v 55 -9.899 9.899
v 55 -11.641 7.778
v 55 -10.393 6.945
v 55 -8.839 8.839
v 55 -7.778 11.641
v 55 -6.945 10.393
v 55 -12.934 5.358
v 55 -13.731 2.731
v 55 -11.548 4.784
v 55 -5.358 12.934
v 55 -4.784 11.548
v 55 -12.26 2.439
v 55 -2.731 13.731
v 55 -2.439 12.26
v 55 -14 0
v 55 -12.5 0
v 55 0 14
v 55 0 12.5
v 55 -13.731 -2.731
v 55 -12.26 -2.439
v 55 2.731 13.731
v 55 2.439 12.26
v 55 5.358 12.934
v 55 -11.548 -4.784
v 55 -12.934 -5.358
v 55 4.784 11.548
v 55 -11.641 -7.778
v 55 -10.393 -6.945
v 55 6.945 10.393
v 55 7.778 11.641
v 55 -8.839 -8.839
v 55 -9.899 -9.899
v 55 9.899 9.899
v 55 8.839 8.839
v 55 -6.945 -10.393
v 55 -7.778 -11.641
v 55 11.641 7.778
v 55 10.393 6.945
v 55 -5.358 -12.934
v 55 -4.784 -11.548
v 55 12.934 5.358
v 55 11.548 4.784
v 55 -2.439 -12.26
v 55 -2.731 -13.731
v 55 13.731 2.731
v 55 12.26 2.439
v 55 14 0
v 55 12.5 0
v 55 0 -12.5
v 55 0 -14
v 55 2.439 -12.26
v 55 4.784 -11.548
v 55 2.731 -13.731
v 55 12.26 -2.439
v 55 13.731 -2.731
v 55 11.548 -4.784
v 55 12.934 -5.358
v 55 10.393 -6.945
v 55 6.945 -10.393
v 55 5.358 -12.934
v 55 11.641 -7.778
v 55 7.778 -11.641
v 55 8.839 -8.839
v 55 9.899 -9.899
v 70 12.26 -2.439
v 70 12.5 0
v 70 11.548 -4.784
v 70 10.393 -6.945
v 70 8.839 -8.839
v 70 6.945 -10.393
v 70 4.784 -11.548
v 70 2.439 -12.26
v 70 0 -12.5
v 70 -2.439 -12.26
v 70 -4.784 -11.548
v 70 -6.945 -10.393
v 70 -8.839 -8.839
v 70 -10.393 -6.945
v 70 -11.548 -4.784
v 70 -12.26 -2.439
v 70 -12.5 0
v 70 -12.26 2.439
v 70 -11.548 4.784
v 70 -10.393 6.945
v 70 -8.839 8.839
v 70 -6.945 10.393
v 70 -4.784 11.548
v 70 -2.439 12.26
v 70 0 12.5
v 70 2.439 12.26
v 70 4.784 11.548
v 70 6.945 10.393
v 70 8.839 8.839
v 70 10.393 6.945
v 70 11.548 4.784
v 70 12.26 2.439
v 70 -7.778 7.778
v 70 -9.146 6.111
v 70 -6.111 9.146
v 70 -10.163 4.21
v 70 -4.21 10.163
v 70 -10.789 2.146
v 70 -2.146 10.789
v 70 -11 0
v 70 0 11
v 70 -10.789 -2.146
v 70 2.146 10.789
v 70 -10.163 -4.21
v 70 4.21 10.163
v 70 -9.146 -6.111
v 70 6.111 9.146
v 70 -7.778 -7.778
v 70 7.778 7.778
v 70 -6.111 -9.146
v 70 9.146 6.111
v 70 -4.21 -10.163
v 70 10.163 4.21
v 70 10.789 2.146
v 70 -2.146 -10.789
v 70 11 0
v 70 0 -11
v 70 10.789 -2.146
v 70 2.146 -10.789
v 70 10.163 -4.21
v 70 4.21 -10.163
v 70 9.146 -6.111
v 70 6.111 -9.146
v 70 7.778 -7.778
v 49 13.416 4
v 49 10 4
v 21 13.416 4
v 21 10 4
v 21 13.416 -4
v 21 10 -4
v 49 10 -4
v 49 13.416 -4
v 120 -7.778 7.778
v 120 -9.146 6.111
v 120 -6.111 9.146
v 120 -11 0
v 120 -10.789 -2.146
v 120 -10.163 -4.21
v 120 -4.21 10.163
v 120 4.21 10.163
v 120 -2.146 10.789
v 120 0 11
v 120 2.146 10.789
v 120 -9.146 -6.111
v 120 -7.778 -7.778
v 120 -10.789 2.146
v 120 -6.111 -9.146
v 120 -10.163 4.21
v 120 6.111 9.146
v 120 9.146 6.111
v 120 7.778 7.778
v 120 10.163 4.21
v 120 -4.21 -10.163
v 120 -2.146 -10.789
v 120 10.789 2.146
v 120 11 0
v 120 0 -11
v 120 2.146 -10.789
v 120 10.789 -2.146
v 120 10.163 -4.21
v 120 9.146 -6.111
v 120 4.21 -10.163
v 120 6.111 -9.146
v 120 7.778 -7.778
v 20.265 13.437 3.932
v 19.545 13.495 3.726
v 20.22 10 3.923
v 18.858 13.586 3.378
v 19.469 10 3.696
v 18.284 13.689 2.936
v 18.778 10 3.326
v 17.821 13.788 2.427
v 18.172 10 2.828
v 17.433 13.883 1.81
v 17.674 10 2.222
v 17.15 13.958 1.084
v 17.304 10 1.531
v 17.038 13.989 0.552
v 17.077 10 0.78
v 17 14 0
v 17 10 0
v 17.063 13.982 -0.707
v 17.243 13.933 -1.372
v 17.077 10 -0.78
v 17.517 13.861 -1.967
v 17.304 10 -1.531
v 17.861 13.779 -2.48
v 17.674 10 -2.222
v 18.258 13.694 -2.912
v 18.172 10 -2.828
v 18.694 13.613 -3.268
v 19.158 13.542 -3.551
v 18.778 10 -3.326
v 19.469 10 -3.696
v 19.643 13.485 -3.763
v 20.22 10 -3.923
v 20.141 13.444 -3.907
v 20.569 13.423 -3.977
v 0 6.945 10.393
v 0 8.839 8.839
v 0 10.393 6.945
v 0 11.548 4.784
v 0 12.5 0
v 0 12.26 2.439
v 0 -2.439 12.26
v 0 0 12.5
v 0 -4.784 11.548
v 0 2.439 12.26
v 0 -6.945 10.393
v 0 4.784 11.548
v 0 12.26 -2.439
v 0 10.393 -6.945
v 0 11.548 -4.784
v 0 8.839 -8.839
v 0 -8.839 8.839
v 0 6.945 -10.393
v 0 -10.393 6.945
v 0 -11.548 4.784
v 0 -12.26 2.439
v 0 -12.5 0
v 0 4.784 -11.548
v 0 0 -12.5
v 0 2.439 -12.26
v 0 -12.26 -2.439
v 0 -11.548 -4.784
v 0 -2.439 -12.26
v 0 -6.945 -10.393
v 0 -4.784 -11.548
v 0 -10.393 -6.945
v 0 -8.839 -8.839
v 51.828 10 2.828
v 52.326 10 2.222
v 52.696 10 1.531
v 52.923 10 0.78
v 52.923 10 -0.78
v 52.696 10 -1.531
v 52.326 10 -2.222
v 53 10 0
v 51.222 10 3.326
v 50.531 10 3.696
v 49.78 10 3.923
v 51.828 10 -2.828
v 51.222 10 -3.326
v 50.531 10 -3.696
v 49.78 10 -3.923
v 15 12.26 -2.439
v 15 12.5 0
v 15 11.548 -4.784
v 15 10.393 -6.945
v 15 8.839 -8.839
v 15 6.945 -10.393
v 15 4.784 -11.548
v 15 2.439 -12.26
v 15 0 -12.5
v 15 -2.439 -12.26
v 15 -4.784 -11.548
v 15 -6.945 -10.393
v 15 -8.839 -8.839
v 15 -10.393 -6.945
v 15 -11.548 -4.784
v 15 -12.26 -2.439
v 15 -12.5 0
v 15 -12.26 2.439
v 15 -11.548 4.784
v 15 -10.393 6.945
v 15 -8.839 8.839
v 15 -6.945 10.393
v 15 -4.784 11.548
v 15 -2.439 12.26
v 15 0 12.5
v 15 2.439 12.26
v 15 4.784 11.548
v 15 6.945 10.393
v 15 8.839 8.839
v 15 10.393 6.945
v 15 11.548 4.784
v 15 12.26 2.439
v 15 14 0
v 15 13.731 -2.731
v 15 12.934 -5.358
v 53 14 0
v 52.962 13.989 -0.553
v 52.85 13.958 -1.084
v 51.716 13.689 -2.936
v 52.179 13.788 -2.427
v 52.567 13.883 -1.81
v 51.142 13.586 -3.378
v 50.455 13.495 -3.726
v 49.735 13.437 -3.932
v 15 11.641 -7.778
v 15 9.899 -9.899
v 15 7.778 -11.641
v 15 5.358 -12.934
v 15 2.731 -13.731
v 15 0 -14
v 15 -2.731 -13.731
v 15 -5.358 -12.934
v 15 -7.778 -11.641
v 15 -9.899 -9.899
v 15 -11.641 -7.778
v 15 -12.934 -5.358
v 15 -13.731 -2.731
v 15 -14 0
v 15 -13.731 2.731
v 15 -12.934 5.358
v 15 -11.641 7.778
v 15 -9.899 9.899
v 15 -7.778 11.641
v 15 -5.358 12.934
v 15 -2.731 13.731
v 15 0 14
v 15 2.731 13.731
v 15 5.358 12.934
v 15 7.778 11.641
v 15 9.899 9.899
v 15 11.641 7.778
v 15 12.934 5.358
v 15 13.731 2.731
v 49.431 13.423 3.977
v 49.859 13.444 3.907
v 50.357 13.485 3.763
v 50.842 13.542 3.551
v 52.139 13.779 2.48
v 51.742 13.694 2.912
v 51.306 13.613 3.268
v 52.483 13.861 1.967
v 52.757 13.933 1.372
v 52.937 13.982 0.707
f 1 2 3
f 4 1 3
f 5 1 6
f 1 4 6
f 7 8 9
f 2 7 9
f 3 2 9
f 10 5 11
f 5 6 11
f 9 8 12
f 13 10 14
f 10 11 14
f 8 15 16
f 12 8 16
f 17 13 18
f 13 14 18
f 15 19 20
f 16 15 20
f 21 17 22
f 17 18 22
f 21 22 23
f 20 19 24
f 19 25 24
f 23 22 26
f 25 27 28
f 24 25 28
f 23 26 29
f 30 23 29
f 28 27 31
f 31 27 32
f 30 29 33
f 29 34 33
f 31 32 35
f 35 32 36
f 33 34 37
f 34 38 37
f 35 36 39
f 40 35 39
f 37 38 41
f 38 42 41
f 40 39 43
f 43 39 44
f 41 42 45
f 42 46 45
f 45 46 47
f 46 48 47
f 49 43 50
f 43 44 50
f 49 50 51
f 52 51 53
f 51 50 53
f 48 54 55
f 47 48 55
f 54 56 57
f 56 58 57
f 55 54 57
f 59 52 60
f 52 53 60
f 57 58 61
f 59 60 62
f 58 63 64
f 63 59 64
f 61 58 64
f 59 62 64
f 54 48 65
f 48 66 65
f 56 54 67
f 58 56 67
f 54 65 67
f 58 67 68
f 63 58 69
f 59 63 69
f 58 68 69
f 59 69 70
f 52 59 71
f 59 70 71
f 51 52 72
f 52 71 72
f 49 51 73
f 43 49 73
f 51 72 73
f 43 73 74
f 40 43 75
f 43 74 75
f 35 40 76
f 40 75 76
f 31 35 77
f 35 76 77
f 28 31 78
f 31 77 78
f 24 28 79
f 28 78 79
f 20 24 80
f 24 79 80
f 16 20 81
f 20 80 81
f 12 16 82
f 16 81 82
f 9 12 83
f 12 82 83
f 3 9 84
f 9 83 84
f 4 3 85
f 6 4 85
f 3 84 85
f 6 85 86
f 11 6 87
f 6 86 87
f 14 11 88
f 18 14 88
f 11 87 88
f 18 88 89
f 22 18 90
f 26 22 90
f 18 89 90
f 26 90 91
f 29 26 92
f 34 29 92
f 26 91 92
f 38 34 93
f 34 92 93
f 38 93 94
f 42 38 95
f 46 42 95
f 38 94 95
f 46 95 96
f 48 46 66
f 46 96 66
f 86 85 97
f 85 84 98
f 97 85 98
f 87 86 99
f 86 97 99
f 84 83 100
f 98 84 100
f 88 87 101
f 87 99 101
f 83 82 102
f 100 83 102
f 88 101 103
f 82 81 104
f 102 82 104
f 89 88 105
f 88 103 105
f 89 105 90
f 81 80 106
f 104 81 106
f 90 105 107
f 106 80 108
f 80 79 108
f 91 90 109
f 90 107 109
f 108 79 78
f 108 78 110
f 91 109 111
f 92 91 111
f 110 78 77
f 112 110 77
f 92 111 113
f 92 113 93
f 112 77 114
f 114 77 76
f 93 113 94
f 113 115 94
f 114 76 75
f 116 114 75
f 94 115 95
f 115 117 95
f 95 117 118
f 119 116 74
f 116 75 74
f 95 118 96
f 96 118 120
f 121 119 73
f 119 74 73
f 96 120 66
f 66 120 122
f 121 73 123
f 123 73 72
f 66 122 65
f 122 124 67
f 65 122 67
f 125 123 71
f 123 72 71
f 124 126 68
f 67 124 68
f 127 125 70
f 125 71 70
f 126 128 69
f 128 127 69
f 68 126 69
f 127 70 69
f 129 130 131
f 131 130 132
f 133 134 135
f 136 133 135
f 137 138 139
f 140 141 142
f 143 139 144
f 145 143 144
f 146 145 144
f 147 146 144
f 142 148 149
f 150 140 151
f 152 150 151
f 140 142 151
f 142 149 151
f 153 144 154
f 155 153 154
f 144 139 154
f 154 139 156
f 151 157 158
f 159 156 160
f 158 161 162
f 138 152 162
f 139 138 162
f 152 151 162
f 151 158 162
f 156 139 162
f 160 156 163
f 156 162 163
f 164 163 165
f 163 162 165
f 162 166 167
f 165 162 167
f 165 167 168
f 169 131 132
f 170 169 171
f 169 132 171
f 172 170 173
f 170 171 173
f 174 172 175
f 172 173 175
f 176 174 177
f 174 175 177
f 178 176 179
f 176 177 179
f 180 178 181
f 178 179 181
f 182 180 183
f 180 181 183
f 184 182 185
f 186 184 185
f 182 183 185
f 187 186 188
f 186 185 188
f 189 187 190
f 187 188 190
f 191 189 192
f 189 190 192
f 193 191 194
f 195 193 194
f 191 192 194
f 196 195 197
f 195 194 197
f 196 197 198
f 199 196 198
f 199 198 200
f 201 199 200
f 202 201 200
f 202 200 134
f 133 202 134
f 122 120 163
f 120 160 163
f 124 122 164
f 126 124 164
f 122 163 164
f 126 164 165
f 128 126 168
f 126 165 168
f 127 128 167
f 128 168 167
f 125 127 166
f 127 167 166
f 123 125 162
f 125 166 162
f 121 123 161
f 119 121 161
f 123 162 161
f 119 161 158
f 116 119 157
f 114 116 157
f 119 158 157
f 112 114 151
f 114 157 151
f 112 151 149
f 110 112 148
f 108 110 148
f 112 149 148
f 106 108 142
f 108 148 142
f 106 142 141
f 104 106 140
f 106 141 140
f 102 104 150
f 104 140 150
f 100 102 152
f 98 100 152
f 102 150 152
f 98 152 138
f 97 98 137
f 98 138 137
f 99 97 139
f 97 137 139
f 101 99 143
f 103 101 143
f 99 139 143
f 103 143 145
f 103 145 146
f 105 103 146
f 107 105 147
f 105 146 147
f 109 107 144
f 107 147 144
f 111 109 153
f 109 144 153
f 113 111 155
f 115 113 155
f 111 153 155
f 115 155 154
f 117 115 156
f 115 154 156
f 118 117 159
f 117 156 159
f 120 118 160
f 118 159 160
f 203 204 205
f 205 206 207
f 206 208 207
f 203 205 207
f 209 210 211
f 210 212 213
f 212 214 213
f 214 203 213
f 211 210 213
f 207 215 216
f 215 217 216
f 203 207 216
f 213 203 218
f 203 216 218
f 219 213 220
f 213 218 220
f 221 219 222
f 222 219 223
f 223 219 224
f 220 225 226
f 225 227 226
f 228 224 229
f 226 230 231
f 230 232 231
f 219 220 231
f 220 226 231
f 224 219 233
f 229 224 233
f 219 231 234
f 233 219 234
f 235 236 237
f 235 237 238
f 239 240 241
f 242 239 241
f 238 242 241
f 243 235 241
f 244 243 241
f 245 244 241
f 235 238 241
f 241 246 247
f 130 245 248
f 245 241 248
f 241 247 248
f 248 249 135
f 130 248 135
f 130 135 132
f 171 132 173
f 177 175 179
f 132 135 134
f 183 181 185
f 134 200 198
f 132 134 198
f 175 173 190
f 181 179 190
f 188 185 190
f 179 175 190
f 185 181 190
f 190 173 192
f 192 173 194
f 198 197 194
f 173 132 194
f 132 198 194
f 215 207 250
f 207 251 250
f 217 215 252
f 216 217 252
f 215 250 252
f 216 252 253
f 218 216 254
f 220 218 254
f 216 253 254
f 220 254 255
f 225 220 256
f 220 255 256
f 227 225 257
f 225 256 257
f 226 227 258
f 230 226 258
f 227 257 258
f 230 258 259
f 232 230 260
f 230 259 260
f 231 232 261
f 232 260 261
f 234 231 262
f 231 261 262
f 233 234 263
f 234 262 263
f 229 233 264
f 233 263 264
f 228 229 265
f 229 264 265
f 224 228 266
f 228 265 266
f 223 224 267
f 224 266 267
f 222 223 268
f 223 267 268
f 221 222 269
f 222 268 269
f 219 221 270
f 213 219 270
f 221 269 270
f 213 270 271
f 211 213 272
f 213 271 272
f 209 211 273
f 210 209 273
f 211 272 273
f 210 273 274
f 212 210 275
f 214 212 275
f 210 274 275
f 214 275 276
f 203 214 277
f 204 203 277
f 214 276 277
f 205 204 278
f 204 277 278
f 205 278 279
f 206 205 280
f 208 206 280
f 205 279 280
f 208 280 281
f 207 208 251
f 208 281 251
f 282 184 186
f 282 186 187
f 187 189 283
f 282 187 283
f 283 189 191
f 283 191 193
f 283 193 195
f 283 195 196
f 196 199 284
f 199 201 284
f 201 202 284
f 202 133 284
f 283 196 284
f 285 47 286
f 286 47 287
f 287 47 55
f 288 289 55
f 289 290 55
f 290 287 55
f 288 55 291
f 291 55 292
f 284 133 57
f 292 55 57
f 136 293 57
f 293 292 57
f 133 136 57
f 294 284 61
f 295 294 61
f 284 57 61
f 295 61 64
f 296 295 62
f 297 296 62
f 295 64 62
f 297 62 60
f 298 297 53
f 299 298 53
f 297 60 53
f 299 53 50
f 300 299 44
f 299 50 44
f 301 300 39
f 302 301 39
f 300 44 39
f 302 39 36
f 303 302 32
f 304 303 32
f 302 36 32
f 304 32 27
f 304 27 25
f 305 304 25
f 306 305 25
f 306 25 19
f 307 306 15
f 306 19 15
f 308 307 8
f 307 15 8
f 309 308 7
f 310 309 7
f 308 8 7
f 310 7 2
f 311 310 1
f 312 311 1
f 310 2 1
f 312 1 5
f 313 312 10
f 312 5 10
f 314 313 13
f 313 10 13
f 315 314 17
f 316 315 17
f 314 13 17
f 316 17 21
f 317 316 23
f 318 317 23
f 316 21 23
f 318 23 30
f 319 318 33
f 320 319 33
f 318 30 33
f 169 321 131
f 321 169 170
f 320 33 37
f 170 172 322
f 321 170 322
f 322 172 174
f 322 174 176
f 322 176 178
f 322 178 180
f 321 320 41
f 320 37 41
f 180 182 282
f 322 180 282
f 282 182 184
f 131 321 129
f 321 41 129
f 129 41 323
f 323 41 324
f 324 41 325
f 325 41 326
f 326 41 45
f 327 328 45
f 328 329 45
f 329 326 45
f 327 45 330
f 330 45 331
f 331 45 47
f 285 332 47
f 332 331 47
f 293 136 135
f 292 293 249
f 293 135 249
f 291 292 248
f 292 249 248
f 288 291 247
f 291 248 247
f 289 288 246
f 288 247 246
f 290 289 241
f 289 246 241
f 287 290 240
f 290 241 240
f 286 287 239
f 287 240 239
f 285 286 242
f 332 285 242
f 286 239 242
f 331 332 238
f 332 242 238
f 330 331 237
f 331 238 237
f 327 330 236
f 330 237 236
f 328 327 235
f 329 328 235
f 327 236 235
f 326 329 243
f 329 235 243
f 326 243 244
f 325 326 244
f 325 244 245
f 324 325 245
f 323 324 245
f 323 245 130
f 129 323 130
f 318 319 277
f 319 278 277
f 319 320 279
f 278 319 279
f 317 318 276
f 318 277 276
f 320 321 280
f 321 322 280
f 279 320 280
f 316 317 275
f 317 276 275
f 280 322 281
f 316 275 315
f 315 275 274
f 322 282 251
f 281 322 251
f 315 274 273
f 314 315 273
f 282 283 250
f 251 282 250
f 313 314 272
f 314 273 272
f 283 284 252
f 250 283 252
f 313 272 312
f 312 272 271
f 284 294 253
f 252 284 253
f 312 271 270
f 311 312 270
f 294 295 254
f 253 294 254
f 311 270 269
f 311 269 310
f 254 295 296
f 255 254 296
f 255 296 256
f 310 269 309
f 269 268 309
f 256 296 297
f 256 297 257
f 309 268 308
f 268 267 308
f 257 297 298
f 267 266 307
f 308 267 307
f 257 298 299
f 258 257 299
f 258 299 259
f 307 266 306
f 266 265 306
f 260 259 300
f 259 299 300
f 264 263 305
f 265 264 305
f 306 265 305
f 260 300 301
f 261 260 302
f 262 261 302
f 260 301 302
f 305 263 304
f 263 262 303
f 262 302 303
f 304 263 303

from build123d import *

# Parameters (mm, degrees)
CUT_EXTRUDE_START   = 10
CUT_EXTRUDE_1_DEPTH = 112.622366364


with BuildPart() as part:
    # Эскиз1 → Повернуть1 (revolve)
    with BuildSketch(Plane.XY):
        Polygon((0, 0), (0, 12.5), (15, 12.5), (15, 14), (55, 14), (55, 12.5), (70, 12.5), (70, 11), (120, 11), (120, 0), align=None)
    revolve(axis=Axis((120, 0, 0), (-1, 0, 0)))

    # Эскиз3 → Вырез-Вытянуть1 (cut, through all)
    with BuildSketch(Plane(origin=(0, 0, 0), x_dir=(1, 0, 0), z_dir=(0, 1, 0)).offset(CUT_EXTRUDE_START)):
        with BuildLine():
            Line((21, 4), (49, 4))
            ThreePointArc((49, 4), (53, 0), (49, -4))
            Line((49, -4), (21, -4))
            ThreePointArc((21, -4), (17, 0), (21, 4))
        make_face()
    extrude(amount=CUT_EXTRUDE_1_DEPTH, mode=Mode.SUBTRACT)


solid = part.part
